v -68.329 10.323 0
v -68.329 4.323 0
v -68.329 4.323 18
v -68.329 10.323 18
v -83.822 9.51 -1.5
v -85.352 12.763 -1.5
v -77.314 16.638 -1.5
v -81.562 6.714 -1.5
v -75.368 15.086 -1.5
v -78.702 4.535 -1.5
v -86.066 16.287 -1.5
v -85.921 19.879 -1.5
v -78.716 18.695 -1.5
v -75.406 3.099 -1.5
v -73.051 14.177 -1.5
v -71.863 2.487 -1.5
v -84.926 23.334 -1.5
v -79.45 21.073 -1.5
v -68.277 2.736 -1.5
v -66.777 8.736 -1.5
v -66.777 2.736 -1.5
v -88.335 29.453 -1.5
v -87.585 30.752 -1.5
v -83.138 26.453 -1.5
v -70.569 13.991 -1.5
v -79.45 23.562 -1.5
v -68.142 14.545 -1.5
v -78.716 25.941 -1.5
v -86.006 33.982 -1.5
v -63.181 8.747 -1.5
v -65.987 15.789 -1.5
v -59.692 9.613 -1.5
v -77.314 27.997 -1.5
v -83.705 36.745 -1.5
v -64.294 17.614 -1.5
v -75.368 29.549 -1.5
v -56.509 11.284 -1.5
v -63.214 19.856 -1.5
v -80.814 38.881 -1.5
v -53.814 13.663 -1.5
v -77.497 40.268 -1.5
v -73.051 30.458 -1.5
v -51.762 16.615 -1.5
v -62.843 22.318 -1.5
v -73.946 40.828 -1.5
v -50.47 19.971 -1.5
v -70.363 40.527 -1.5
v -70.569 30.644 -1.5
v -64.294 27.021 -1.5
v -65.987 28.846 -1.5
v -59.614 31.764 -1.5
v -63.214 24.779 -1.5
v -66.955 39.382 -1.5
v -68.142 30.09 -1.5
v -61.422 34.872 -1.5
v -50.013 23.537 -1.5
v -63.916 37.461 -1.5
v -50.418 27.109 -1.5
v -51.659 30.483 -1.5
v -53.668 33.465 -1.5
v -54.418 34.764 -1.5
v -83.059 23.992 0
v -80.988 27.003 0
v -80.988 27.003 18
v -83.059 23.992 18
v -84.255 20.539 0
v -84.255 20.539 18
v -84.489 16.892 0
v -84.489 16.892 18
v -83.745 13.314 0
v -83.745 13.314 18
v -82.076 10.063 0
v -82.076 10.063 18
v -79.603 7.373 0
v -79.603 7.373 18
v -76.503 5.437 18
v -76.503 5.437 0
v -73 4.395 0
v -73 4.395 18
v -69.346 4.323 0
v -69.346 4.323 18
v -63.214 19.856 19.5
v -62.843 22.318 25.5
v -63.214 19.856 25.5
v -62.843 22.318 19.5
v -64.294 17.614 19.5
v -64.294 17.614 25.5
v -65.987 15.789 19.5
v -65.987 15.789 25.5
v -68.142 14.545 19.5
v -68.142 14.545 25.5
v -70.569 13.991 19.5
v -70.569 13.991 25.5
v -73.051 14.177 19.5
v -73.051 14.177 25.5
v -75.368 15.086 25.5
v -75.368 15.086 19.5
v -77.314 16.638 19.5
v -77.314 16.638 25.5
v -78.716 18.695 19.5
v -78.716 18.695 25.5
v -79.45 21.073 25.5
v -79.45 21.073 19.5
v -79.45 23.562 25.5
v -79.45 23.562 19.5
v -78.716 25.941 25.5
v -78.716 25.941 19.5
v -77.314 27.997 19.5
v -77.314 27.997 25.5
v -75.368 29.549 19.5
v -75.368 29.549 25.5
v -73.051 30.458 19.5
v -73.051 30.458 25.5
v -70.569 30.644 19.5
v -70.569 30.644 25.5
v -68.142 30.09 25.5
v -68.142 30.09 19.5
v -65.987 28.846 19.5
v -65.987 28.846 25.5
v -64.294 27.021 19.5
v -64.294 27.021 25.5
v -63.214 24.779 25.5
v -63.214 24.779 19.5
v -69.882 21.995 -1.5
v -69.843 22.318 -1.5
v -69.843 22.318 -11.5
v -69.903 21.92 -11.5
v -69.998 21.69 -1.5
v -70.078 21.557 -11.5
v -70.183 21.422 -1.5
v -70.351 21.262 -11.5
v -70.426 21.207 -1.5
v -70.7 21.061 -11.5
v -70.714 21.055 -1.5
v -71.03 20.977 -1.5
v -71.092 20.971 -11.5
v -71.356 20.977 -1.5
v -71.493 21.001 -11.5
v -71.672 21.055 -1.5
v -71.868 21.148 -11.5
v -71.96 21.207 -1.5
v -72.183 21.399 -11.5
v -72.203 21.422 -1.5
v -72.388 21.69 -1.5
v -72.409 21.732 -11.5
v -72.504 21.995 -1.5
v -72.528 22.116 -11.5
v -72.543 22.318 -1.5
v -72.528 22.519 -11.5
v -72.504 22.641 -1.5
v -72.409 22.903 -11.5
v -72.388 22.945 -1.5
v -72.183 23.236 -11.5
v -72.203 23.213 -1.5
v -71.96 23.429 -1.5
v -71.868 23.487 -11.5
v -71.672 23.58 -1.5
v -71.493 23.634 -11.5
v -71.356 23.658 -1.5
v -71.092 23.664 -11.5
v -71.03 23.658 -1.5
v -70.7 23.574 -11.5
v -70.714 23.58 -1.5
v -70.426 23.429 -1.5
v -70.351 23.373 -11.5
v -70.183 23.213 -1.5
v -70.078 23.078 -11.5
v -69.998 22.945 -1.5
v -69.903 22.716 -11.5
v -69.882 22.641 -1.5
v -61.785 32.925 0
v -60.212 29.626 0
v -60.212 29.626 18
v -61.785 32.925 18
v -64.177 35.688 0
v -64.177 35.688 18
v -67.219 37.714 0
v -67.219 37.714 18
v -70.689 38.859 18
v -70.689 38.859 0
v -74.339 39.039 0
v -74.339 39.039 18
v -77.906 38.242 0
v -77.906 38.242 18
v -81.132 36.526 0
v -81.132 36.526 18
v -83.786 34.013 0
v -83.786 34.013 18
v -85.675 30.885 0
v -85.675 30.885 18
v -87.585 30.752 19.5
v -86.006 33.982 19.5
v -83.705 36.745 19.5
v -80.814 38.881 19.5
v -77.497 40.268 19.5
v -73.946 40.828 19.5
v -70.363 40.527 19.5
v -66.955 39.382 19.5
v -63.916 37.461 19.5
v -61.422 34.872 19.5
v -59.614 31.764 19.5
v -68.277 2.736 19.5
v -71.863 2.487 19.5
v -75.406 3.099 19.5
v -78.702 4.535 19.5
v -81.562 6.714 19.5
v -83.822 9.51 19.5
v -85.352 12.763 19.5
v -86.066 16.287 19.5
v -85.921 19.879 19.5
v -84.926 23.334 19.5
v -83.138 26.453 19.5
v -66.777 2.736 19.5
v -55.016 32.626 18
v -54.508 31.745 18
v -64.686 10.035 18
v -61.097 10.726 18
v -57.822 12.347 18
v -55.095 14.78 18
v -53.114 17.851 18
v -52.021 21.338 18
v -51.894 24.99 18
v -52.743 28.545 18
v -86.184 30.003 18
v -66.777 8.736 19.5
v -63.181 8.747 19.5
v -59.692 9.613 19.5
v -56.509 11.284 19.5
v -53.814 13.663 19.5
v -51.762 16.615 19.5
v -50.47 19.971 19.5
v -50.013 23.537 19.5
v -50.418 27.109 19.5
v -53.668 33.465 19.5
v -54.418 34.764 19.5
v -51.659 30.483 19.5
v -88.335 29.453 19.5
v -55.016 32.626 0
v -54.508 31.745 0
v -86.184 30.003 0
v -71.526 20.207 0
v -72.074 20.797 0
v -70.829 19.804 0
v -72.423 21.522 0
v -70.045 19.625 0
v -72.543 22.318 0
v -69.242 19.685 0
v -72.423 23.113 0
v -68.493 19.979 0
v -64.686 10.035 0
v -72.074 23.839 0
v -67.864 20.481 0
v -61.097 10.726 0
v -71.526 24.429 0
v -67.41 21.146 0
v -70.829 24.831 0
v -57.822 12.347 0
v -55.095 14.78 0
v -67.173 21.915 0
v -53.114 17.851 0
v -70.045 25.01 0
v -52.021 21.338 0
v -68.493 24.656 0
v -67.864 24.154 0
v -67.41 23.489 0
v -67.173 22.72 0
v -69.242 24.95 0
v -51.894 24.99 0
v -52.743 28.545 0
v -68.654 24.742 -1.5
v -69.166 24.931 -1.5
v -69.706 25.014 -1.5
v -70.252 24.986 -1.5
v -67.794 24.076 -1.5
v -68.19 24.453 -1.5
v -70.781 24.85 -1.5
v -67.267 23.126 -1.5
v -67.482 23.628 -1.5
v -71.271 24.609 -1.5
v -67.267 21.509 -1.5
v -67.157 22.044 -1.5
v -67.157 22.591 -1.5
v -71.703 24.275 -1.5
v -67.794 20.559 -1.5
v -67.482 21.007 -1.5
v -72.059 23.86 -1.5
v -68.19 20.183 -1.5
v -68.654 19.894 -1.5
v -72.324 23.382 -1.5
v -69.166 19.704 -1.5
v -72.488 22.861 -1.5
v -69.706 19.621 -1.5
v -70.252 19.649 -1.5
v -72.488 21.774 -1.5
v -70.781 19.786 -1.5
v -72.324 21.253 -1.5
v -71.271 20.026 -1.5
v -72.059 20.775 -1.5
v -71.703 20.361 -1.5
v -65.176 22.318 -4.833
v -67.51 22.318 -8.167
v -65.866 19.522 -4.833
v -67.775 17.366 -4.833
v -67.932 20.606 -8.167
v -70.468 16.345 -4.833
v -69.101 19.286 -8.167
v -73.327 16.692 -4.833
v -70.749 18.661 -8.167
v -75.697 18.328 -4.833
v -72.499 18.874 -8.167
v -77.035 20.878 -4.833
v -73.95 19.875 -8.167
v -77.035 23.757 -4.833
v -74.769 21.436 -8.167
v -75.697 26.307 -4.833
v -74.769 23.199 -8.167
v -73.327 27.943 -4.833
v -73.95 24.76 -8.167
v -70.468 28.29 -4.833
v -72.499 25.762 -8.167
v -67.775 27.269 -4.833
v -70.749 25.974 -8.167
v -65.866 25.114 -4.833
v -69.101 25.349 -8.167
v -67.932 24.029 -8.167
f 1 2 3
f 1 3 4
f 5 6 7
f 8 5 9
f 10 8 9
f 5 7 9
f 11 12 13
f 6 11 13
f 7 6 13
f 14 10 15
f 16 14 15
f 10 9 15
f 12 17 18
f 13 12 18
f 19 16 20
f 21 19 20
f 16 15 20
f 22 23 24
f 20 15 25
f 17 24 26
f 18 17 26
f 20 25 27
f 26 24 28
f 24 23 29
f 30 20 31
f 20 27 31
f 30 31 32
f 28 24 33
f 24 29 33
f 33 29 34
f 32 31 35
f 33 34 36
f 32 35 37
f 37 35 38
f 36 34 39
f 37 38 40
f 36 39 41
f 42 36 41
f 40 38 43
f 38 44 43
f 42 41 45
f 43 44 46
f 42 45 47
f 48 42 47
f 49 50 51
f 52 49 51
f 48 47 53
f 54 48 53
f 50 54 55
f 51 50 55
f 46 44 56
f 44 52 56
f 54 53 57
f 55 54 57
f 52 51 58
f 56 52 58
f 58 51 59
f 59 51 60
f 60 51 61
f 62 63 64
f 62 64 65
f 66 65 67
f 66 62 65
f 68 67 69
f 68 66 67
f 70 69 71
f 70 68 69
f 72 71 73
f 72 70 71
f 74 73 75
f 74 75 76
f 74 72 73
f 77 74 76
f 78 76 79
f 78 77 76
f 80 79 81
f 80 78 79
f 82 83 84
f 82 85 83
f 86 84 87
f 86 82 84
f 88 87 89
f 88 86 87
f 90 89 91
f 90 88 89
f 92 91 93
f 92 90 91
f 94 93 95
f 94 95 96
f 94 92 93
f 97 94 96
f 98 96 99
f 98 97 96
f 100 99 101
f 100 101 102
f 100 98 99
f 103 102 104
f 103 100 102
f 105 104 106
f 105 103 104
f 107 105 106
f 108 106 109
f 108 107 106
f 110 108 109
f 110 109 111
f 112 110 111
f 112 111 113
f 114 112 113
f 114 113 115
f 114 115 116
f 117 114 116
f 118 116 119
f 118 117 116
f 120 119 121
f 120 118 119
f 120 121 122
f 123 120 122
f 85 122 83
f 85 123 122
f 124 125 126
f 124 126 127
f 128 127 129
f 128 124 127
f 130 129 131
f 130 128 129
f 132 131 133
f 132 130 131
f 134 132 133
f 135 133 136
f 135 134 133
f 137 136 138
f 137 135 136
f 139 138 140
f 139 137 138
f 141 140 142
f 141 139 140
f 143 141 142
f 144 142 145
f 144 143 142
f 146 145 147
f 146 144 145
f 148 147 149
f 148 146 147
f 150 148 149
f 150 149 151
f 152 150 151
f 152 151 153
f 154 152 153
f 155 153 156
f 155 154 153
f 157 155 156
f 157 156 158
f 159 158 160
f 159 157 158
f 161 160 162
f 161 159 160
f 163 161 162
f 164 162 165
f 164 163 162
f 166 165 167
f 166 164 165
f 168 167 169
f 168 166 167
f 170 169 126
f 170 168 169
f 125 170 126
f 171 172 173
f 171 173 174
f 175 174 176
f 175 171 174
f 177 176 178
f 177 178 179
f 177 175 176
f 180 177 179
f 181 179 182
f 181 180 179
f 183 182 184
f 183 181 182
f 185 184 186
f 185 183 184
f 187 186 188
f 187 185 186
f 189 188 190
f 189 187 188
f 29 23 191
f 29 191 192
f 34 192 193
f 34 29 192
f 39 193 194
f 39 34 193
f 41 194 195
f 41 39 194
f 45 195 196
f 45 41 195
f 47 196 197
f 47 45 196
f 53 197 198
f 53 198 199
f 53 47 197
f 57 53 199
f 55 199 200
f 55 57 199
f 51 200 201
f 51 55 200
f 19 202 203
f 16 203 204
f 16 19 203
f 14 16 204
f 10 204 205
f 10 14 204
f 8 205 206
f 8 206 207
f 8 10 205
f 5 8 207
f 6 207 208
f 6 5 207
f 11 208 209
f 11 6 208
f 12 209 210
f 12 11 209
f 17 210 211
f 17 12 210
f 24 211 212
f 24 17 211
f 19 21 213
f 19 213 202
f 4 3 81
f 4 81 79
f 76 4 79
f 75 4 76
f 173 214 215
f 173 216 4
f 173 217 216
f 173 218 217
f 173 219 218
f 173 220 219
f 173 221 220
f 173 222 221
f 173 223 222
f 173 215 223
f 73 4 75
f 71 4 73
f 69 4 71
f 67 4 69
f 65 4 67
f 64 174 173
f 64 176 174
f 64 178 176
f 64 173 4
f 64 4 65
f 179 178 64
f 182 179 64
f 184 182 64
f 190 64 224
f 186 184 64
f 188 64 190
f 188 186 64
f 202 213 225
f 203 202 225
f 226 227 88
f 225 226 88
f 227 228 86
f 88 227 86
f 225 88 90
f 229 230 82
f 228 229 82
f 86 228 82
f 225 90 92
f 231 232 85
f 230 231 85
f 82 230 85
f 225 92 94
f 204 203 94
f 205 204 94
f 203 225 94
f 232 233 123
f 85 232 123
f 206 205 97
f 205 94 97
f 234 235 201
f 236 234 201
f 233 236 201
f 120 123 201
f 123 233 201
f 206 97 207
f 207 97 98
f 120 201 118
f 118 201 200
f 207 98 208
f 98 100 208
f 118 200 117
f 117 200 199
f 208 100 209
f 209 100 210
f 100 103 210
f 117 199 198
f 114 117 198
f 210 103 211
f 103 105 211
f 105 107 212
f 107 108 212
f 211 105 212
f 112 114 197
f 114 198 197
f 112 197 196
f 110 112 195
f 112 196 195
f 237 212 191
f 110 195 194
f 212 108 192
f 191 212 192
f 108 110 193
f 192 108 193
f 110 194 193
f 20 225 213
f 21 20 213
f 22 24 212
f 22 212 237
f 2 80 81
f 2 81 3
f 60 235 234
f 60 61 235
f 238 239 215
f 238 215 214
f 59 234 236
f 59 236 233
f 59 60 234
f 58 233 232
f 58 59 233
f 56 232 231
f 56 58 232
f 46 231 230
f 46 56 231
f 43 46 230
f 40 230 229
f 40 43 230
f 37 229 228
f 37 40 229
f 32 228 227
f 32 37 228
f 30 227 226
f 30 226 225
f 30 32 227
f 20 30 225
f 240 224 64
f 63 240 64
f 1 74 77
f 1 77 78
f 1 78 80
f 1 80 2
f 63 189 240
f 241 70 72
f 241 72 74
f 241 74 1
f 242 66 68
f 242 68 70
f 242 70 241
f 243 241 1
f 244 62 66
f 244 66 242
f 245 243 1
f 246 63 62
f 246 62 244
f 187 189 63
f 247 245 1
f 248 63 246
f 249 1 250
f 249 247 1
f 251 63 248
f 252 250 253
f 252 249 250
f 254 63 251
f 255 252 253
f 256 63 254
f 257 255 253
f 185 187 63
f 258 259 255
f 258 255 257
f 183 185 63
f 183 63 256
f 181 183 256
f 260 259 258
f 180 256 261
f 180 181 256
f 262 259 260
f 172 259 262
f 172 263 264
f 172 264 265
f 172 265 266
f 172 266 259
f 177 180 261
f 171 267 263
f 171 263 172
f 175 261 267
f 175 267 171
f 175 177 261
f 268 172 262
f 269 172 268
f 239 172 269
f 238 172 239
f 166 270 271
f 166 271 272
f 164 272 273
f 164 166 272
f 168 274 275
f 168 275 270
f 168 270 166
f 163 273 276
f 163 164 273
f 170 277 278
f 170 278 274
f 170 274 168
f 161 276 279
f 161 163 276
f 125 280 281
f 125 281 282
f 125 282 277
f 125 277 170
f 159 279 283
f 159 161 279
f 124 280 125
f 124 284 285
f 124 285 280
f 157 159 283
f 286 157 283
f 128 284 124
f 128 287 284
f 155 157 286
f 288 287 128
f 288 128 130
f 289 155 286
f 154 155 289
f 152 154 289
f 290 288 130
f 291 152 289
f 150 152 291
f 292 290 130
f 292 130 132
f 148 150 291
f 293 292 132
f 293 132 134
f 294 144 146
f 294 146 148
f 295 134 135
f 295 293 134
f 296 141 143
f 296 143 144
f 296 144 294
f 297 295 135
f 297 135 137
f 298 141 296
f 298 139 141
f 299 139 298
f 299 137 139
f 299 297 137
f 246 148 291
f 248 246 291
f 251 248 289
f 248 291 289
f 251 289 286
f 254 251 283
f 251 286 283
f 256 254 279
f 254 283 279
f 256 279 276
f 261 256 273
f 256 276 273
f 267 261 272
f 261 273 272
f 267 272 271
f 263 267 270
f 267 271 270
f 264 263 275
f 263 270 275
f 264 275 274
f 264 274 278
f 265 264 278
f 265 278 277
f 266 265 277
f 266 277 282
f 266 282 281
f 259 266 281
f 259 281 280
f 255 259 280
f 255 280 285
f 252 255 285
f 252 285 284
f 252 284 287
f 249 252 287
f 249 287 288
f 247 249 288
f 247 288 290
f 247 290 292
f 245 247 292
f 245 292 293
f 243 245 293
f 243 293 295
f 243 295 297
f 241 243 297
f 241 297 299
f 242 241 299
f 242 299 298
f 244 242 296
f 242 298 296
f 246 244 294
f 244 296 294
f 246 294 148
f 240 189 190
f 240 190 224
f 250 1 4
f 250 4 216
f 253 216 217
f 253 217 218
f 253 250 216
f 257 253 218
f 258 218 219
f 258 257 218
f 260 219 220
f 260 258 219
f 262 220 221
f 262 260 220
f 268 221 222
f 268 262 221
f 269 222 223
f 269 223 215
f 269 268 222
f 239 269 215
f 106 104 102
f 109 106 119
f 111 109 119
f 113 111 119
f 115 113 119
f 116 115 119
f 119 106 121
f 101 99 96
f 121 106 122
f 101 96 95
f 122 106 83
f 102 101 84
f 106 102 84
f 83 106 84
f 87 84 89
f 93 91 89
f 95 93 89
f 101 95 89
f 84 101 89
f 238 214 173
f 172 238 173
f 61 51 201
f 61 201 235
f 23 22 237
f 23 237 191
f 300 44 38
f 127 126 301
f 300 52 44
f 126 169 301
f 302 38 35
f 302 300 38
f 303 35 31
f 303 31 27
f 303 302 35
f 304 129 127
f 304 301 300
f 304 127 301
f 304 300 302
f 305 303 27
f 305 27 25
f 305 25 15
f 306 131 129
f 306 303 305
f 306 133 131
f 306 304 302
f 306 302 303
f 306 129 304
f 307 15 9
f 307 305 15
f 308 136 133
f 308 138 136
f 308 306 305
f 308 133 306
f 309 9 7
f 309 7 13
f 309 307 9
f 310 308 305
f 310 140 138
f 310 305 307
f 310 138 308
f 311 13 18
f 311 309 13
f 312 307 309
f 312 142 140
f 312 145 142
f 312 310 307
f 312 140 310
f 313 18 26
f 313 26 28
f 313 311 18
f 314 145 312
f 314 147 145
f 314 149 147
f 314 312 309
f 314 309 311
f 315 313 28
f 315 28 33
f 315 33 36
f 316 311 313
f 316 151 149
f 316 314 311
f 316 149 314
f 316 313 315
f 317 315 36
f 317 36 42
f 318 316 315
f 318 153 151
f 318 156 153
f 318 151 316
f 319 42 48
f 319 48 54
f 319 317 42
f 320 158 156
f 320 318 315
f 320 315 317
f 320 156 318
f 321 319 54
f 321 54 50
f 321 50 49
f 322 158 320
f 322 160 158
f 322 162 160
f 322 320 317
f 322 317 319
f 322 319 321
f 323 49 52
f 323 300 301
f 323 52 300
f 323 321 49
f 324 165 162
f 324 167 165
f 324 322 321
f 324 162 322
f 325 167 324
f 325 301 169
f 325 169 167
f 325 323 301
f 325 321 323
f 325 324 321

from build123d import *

# Parameters (mm, degrees)
SALIENTE_EXTRUIR1_DEPTH = 18
SALIENTE_EXTRUIR2_START = 1.5
CROQUIS2_R              = 2.7
SALIENTE_EXTRUIR2_DEPTH = 1.5
SALIENTE_EXTRUIR3_DEPTH = 1.5
CROQUIS6_W              = 5.4
CROQUIS6_H              = 1.803822617
SALIENTE_EXTRUIR7_DEPTH = 10
CROQUIS10_W             = 5.4
CROQUIS10_H             = 10
CORTAR_EXTRUIR3_DEPTH   = 10
CROQUIS11_W             = 8.35
CROQUIS11_H             = 6


with BuildPart() as part:
    # Croquis1 → Saliente-Extruir1 (new body)
    with BuildSketch(Plane.XY):
        with BuildLine():
            Line((-53.667784589, 33.4650382), (-54.417784589, 34.764076306))
            Line((-54.417784589, 34.764076306), (-59.613937012, 31.764076306))
            ThreePointArc((-59.613937012, 31.764076306), (-73.945502317, 40.827707086), (-87.584573208, 30.752047693))
            Line((-87.584573208, 30.752047693), (-88.334573208, 29.453009587))
            Line((-88.334573208, 29.453009587), (-83.138420786, 26.453009587))
            ThreePointArc((-83.138420786, 26.453009587), (-83.82197264, 9.509694567), (-68.276660199, 2.735742387))
            Line((-68.276660199, 2.735742387), (-66.776660199, 2.735742387))
            Line((-66.776660199, 2.735742387), (-66.776660199, 8.735742387))
            ThreePointArc((-66.776660199, 8.735742387), (-51.761543041, 16.615426627), (-53.667784589, 33.4650382))
        make_face()
        with BuildLine():
            Line((-54.507549641, 31.745180452), (-55.016343575, 32.626437397))
            Line((-55.016343575, 32.626437397), (-60.212495998, 29.626437397))
            ThreePointArc((-60.212495998, 29.626437397), (-72.508207296, 39.071771198), (-85.675250182, 30.884718699))
            Line((-85.675250182, 30.884718699), (-86.184044116, 30.003461754))
            Line((-86.184044116, 30.003461754), (-80.987891693, 27.003461754))
            ThreePointArc((-80.987891693, 27.003461754), (-83.019935064, 11.632396511), (-69.346218174, 4.322929129))
            Line((-69.346218174, 4.322929129), (-68.328630306, 4.322929129))
            Line((-68.328630306, 4.322929129), (-68.328630306, 10.322929129))
            ThreePointArc((-68.328630306, 10.322929129), (-54.000875637, 16.248660571), (-54.507549641, 31.745180452))
        make_face(mode=Mode.SUBTRACT)
    extrude(amount=SALIENTE_EXTRUIR1_DEPTH)

    # Croquis2 → Saliente-Extruir2 (add)
    with BuildSketch(Plane(origin=(0, 0, 0), x_dir=(-1, 0, 0), z_dir=(0, 0, -1)).offset(SALIENTE_EXTRUIR2_START)):
        with BuildLine():
            Line((87.584573208, 30.752047693), (88.334573208, 29.453009587))
            Line((88.334573208, 29.453009587), (83.138420786, 26.453009587))
            ThreePointArc((83.138420786, 26.453009587), (83.82197264, 9.509694567), (68.276660199, 2.735742387))
            Line((68.276660199, 2.735742387), (66.776660199, 2.735742387))
            Line((66.776660199, 2.735742387), (66.776660199, 8.735742387))
            ThreePointArc((66.776660199, 8.735742387), (51.761543041, 16.615426627), (53.667784589, 33.4650382))
            Line((53.667784589, 33.4650382), (54.417784589, 34.764076306))
            Line((54.417784589, 34.764076306), (59.613937012, 31.764076306))
            ThreePointArc((59.613937012, 31.764076306), (73.945502317, 40.827707086), (87.584573208, 30.752047693))
        make_face()
        with Locations((69.843005999, 22.317609427)):
            Circle(CROQUIS2_R, mode=Mode.SUBTRACT)
    extrude(amount=-SALIENTE_EXTRUIR2_DEPTH)

    # Croquis3 → Saliente-Extruir3 (add)
    with BuildSketch(Plane.XY.offset(18)):
        with BuildLine():
            Line((-66.776660199, 8.735742387), (-66.776660199, 2.735742387))
            Line((-66.776660199, 2.735742387), (-68.276660199, 2.735742387))
            ThreePointArc((-68.276660199, 2.735742387), (-83.82197264, 9.509694567), (-83.138420786, 26.453009587))
            Line((-83.138420786, 26.453009587), (-88.334573208, 29.453009587))
            Line((-88.334573208, 29.453009587), (-87.584573208, 30.752047693))
            ThreePointArc((-87.584573208, 30.752047693), (-73.945502317, 40.827707086), (-59.613937012, 31.764076306))
            Line((-59.613937012, 31.764076306), (-54.417784589, 34.764076306))
            Line((-54.417784589, 34.764076306), (-53.667784589, 33.4650382))
            ThreePointArc((-53.667784589, 33.4650382), (-51.761543041, 16.615426627), (-66.776660199, 8.735742387))
        make_face()
    extrude(amount=SALIENTE_EXTRUIR3_DEPTH)

    # Croquis6 → Saliente-Extruir7 (add)
    with BuildSketch(Plane(origin=(0, 0, -1.5), x_dir=(-1, 0, 0), z_dir=(0, 0, -1))):
        with Locations((69.843005999, 21.415698119)):
            Rectangle(CROQUIS6_W, CROQUIS6_H)
    extrude(amount=SALIENTE_EXTRUIR7_DEPTH)

    # Croquis10 → Cortar-Extruir3 (cut)
    with BuildSketch(Plane(origin=(0, 22.317609427, 0), x_dir=(1, 0, 0), z_dir=(0, 1, 0))):
        with Locations((-69.843005999, 6.5)):
            Rectangle(CROQUIS10_W, CROQUIS10_H)
    extrude(amount=-CORTAR_EXTRUIR3_DEPTH, mode=Mode.SUBTRACT)

    # Croquis11 → Revolución1 (revolve)
    with BuildSketch(Plane(origin=(0, 22.317609427, 0), x_dir=(1, 0, 0), z_dir=(0, 1, 0)), mode=Mode.PRIVATE) as revoluci_n1_sk:
        Polygon((-72.543005999, 1.5), (-79.543005999, 1.5), (-72.543005999, 11.5), align=None)
        with Locations((-75.368005999, -22.5)):
            Rectangle(CROQUIS11_W, CROQUIS11_H)
    revolve(revoluci_n1_sk.sketch.rotate(Axis((-71.193005999, 22.317609427, 25.5), (0, 0, -1)), 180), axis=Axis((-71.193005999, 22.317609427, 25.5), (0, 0, -1)))


solid = part.part
